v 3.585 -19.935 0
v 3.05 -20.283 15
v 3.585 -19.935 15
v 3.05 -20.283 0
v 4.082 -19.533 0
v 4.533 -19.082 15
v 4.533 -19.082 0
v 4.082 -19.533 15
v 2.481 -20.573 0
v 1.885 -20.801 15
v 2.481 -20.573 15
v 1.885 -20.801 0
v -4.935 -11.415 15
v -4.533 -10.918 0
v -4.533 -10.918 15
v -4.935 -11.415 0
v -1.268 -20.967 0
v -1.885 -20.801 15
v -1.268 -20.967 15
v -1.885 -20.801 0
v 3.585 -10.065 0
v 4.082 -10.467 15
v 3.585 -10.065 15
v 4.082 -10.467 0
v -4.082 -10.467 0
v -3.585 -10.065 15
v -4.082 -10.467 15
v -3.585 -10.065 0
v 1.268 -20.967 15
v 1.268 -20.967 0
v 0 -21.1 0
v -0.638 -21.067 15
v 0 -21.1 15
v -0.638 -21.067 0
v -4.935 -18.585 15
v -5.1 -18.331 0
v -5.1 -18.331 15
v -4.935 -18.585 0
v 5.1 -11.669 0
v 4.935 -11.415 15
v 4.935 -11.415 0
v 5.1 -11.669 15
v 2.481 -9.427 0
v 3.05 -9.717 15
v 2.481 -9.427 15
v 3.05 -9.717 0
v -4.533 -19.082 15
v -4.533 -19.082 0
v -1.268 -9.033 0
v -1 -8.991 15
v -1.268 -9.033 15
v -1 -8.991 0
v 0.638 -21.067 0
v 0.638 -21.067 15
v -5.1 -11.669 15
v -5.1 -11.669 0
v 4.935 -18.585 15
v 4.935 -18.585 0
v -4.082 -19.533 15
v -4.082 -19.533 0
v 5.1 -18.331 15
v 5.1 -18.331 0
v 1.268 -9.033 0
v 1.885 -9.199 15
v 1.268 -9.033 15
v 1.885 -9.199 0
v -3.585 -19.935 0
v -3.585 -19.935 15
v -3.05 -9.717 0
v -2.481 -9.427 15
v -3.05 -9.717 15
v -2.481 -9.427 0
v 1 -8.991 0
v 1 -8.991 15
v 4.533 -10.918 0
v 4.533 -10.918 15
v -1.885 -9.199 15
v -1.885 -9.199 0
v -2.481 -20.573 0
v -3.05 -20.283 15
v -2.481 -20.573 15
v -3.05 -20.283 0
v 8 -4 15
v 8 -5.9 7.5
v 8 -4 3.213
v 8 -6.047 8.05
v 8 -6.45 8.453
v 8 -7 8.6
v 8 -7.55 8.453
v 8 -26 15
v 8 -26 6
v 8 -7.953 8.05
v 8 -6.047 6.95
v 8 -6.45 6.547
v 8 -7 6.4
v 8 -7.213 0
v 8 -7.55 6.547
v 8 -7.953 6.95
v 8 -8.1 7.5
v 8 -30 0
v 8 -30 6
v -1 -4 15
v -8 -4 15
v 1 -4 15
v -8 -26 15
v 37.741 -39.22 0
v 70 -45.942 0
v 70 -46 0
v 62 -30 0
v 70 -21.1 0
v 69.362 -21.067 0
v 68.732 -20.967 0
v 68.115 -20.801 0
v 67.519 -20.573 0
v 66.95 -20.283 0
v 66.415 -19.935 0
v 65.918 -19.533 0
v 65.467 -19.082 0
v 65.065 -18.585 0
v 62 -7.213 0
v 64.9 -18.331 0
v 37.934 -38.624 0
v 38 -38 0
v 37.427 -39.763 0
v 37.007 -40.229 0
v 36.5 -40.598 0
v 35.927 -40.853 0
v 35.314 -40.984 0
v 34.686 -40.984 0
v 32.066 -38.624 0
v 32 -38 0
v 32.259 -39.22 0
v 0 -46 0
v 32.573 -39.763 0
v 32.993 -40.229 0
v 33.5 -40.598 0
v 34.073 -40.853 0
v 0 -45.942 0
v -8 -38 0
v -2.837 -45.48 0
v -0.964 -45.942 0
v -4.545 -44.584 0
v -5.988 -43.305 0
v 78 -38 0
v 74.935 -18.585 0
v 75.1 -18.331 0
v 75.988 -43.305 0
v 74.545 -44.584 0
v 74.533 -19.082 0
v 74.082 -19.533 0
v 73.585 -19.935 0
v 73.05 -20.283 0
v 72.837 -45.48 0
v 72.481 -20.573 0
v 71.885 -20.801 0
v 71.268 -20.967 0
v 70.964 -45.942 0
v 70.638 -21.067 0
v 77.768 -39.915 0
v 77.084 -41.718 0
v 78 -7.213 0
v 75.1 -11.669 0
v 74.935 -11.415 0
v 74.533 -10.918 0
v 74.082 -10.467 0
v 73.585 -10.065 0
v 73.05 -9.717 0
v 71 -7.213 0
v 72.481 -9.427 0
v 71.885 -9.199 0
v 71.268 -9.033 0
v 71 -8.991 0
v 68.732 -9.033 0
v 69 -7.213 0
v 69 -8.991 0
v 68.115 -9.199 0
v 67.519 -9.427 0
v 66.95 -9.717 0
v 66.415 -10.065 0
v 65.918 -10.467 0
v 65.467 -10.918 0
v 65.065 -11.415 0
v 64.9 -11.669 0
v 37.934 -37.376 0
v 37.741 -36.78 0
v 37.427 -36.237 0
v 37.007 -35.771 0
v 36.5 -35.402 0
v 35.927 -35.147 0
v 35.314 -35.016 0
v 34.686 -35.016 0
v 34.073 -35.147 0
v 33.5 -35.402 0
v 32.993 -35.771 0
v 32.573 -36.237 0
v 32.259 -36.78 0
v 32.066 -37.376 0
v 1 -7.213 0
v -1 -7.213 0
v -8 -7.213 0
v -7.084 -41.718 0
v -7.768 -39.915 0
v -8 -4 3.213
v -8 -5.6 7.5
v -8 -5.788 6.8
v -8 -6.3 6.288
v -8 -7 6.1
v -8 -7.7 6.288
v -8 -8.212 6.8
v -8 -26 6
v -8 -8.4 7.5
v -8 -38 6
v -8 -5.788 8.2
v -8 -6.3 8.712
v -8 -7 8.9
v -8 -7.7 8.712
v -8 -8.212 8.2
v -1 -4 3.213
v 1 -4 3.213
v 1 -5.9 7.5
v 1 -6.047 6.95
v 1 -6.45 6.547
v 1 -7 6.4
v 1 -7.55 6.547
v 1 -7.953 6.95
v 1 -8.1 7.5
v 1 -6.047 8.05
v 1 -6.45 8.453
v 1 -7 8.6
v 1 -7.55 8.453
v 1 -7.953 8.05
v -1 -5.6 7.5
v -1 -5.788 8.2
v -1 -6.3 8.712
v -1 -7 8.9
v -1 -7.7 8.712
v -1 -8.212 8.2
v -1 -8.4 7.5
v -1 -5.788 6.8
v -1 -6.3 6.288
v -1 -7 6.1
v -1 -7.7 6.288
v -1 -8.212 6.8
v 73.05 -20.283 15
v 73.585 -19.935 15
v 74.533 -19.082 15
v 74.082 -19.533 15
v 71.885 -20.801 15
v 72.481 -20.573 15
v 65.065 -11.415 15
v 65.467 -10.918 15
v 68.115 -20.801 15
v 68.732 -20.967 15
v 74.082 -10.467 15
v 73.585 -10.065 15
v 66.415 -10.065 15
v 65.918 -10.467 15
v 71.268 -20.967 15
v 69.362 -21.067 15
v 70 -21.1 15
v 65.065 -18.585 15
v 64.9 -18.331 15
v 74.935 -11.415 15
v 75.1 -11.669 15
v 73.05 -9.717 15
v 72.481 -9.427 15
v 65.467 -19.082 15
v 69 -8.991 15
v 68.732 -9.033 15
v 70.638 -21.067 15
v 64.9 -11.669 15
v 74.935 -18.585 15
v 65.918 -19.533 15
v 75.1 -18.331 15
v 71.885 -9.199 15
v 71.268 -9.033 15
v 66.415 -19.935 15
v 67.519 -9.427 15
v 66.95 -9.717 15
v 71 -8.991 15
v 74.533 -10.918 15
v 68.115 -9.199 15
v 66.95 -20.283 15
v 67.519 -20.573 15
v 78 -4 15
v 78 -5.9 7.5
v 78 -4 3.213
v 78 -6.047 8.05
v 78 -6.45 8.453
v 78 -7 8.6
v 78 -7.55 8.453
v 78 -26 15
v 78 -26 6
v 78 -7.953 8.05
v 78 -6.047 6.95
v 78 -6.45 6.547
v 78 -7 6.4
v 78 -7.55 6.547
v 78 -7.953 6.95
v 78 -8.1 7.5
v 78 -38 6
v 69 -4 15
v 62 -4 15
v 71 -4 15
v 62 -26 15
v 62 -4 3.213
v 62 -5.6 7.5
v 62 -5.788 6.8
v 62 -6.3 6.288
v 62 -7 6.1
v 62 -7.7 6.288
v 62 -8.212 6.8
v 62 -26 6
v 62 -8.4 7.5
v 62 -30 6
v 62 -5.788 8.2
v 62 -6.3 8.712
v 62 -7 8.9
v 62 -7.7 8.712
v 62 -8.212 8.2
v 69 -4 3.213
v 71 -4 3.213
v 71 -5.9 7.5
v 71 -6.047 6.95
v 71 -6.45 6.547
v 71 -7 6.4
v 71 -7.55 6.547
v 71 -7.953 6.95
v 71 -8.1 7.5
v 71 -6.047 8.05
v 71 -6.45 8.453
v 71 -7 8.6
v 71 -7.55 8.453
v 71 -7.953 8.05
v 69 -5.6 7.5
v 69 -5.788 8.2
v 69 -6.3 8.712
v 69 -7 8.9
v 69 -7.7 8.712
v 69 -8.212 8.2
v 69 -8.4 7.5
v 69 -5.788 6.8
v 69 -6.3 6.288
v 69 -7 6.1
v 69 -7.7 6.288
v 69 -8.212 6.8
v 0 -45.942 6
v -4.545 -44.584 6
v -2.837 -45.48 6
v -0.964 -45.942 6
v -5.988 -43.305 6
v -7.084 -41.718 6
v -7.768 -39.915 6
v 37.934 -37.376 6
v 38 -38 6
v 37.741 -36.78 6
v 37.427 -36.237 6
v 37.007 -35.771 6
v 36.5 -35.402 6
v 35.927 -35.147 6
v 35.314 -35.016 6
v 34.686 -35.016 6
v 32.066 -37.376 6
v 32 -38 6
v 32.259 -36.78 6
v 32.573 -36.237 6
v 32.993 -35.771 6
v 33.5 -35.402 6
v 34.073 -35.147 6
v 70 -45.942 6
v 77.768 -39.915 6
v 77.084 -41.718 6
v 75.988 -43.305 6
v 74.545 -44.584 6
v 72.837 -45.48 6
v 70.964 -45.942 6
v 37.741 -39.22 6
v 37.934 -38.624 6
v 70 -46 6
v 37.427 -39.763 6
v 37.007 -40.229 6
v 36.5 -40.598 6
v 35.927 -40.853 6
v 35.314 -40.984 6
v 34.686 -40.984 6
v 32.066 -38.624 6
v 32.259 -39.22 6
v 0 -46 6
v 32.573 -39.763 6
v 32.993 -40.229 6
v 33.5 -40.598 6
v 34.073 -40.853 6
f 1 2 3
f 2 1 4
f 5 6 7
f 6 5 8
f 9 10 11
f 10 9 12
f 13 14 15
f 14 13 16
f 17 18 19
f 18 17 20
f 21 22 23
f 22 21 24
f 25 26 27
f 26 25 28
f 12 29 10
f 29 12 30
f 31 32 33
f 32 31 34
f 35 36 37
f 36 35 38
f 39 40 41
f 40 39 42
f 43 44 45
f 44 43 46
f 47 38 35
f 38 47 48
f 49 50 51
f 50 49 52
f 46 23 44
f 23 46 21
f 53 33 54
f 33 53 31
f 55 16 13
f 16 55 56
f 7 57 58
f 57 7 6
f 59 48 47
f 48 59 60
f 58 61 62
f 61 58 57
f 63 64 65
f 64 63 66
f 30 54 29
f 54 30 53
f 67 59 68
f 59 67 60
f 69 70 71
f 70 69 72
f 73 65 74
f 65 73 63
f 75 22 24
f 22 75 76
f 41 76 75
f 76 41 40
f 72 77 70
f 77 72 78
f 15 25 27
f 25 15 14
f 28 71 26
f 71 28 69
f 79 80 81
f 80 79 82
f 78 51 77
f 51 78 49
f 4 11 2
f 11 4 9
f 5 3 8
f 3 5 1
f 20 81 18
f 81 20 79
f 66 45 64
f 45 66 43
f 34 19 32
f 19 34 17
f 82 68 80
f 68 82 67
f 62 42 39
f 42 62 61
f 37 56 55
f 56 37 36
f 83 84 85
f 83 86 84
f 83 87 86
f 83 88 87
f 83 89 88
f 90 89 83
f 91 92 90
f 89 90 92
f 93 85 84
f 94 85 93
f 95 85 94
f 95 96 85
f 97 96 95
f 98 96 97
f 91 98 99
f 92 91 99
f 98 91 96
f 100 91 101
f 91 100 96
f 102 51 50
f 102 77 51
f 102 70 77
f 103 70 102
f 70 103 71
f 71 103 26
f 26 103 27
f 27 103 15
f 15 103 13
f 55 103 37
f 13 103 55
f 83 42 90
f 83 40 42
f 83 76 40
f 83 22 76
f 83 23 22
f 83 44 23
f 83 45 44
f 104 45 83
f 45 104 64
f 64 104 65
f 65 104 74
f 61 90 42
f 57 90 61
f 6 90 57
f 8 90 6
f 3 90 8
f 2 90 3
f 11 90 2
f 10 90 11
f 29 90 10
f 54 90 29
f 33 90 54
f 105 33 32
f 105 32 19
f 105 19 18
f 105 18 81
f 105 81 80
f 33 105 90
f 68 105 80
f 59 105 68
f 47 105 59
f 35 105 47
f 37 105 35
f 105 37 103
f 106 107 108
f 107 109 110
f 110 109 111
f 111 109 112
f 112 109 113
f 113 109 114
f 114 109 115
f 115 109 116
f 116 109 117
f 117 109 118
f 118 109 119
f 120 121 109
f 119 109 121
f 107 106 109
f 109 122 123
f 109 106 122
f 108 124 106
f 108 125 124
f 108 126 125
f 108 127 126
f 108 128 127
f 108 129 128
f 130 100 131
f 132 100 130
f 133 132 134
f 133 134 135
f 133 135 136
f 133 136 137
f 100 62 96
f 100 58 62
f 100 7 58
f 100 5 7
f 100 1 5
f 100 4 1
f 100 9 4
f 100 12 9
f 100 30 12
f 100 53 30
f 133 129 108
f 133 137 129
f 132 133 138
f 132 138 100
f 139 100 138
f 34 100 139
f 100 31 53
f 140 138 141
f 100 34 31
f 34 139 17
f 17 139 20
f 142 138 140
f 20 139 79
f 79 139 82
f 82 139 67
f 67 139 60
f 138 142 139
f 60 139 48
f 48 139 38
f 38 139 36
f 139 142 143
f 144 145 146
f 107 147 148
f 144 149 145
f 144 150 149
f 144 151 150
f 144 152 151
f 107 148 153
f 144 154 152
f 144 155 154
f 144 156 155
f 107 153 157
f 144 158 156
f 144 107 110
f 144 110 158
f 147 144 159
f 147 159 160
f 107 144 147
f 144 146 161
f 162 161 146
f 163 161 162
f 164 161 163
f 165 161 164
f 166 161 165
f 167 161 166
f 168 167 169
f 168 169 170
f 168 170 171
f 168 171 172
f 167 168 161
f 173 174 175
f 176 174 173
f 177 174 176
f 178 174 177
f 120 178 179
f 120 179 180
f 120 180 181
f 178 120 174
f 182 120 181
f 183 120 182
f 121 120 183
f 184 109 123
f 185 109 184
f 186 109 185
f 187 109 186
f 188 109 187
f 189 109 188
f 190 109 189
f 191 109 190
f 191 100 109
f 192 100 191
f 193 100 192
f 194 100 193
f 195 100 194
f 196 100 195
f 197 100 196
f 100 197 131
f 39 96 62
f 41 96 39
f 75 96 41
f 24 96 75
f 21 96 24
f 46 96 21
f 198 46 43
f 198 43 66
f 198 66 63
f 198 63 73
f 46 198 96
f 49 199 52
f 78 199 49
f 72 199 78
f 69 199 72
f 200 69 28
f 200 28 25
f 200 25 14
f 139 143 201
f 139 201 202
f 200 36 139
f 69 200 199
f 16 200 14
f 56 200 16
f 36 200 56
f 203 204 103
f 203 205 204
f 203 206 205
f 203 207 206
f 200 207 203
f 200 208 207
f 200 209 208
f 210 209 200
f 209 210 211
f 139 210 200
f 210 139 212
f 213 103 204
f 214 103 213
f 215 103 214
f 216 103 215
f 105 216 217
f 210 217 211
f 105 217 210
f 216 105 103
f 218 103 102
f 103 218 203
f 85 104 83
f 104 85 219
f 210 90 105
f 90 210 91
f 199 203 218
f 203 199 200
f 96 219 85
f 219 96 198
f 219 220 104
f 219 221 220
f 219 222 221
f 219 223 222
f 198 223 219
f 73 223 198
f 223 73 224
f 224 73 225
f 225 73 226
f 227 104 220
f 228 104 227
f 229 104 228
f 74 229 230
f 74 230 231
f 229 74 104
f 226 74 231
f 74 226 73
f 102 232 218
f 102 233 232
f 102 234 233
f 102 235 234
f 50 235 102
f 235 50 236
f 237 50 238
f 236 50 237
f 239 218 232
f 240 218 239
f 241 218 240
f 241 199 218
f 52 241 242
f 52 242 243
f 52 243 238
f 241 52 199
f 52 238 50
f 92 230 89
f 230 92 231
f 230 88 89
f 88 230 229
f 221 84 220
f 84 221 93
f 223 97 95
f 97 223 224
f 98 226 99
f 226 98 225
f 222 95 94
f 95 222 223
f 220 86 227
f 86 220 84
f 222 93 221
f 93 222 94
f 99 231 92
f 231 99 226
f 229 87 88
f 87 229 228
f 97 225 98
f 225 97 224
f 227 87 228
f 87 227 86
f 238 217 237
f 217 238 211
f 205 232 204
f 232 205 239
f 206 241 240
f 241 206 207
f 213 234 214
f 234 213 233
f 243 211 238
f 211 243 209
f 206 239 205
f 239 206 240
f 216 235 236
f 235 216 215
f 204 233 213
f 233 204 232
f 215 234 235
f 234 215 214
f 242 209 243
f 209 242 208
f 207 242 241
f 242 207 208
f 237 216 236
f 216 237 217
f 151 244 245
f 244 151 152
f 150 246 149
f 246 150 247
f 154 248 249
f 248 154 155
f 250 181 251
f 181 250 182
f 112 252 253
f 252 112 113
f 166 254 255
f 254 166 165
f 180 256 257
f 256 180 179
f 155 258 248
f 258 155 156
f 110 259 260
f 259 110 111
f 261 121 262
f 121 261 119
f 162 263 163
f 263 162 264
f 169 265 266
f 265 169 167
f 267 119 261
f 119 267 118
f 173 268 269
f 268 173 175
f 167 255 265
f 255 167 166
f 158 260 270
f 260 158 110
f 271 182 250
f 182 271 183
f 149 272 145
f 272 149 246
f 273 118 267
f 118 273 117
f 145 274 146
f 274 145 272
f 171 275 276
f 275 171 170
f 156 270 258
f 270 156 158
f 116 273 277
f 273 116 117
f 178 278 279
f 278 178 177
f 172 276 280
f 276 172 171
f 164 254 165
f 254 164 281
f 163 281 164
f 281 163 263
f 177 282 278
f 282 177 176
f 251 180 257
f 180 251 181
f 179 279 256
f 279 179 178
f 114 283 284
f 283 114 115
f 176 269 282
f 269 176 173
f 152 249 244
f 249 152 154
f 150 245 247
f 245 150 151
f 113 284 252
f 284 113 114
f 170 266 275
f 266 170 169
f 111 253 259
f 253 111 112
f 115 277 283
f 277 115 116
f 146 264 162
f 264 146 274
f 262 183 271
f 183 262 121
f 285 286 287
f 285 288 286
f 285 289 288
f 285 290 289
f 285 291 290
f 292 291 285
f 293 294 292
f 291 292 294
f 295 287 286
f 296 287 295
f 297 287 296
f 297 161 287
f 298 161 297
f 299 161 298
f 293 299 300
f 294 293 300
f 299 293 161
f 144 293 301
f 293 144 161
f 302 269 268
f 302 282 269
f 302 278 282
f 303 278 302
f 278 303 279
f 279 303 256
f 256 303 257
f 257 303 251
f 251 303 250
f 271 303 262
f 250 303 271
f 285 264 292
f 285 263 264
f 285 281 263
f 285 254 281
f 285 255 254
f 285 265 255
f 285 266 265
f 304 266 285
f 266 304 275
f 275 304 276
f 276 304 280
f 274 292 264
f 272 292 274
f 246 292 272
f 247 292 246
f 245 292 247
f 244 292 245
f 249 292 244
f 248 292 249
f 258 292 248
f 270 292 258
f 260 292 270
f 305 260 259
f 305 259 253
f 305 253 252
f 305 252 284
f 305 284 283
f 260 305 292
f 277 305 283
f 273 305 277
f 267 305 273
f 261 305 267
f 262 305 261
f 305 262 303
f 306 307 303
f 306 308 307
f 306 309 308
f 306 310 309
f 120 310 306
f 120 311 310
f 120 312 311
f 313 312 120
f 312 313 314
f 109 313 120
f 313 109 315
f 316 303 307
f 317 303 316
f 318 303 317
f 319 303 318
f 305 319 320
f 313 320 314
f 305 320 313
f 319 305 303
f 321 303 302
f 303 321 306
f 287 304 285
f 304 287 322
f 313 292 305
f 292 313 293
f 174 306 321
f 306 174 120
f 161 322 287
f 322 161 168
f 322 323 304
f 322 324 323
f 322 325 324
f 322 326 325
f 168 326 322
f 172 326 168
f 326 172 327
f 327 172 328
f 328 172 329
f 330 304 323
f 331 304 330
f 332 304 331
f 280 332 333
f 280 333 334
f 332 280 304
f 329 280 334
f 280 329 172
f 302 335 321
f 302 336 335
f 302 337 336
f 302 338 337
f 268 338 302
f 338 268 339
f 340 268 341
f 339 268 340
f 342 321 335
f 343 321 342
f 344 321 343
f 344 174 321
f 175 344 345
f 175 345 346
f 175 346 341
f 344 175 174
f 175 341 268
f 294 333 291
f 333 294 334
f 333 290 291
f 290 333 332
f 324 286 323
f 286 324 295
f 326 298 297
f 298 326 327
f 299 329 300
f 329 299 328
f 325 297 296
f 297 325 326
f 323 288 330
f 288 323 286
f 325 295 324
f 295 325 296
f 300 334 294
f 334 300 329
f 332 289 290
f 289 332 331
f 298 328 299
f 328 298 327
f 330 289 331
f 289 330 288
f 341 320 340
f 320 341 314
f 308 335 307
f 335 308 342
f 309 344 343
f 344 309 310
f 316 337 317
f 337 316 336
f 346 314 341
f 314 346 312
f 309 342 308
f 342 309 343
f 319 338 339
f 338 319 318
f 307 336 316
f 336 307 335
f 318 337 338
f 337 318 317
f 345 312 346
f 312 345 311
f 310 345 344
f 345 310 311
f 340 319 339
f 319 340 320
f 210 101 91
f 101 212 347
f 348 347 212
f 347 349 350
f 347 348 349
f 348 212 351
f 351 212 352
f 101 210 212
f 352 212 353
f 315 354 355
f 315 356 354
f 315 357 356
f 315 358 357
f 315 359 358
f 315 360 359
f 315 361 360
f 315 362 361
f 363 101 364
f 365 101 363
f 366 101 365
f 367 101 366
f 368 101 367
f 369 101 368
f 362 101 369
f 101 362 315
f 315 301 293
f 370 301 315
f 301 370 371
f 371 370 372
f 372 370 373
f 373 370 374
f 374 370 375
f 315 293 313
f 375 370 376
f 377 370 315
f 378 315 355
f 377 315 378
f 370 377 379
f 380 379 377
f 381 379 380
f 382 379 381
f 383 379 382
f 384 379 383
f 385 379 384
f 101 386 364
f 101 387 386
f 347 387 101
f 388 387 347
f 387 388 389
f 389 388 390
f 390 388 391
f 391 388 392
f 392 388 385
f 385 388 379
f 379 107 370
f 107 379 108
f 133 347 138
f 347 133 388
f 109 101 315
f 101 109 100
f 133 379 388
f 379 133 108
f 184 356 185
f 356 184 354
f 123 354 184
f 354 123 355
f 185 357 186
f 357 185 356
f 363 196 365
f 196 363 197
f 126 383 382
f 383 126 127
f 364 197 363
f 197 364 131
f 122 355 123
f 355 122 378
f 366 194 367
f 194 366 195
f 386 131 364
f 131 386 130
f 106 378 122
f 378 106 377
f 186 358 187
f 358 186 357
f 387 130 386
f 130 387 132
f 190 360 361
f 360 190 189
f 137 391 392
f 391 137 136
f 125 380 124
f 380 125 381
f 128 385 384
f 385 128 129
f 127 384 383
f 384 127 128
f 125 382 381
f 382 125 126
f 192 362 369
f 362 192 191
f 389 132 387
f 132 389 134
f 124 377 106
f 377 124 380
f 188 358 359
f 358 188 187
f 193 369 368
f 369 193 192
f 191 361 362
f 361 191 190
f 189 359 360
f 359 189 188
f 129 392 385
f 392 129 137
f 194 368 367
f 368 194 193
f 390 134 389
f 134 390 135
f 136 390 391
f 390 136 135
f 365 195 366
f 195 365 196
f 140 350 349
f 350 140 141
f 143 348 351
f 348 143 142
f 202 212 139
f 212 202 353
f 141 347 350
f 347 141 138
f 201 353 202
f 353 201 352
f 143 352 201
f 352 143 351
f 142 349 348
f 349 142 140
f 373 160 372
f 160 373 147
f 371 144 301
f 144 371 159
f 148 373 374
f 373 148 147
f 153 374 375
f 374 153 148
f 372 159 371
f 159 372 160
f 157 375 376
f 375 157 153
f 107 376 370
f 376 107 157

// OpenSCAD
translate([-8,-38,0])cube([16,16,6]);
difference(){
translate([-8,-26,0])cube([16,22,15]);
difference(){
    translate([0,-15,-1])cylinder(d=12.2,h=25,$fn=60);
    translate([6.1,-15,-1])cube([2,16,40],center=true);
    translate([-6.1,-15,-1])cube([2,16,40],center=true);
}
translate([0,-1,-15])rotate([45,0,0])cube(30,center=true);
translate([-1,-15,-1])cube([2,22,25]);
translate([-9,-7,7.5])rotate([0,90,0])
cylinder(d=2.2,h=21,$fn=12);
translate([-9,-7,7.5])rotate([0,90,0])
cylinder(d=2.8,h=10,$fn=12);
}

translate([70,0,0]){
translate([-8,-38,0])cube([16,16,6]);
difference(){
translate([-8,-26,0])cube([16,22,15]);
difference(){
    translate([0,-15,-1])cylinder(d=12.2,h=25,$fn=60);
    translate([6.1,-15,-1])cube([2,16,40],center=true);
    translate([-6.1,-15,-1])cube([2,16,40],center=true);
}
translate([0,-1,-15])rotate([45,0,0])cube(30,center=true);
translate([-1,-15,-1])cube([2,22,25]);
translate([-9,-7,7.5])rotate([0,90,0])
cylinder(d=2.2,h=21,$fn=12);
translate([-9,-7,7.5])rotate([0,90,0])
cylinder(d=2.8,h=10,$fn=12);
}
}

difference(){
translate([0,-46,0])cube([70,16,6]);
translate([35,-38,-1])cylinder(d=6,h=8,$fn=30);
}    
translate([0,-38,0])cylinder(d=16,h=6);
translate([70,-38,0])cylinder(d=16,h=6);
